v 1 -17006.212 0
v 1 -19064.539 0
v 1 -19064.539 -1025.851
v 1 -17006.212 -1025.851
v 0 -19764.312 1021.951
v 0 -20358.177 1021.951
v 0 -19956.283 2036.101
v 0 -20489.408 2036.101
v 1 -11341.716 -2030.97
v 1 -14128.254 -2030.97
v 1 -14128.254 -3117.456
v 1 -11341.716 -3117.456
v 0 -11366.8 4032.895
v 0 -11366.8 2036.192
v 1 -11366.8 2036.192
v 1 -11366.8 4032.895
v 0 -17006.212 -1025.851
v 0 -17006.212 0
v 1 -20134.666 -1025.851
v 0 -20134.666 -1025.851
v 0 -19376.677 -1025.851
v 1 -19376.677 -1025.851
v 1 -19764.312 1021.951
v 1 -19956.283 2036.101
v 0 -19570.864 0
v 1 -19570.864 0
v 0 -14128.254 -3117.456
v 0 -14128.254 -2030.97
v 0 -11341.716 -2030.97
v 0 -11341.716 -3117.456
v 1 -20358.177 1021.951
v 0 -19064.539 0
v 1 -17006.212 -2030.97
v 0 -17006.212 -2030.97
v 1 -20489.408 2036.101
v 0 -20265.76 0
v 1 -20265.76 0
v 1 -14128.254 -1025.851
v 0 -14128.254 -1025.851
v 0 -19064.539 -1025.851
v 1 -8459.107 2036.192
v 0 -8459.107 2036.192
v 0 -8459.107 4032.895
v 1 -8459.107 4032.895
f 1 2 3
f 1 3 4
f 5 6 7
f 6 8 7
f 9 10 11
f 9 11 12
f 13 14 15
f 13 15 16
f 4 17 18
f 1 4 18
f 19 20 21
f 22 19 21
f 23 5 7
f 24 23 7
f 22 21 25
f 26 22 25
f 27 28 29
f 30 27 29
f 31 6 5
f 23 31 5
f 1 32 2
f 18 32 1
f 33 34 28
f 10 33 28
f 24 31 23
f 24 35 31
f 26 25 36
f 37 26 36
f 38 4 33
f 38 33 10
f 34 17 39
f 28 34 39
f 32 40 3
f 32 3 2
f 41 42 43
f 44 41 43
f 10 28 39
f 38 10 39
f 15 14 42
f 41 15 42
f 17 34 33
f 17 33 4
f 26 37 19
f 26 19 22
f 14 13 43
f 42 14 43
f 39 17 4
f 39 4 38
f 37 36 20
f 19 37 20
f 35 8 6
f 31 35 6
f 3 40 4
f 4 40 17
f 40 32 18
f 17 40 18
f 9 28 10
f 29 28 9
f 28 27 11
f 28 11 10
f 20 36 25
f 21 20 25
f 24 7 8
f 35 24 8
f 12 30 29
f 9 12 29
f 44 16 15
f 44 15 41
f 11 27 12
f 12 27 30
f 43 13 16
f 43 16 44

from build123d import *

# Parameters (mm, degrees)
F2_W     = 2786.5381240845
F2_H     = 1086.4863395691
F3_DEPTH = 1
F2_W_2   = 2877.9582977295
F2_H_2   = 1005.1188468933
F2_W_3   = 2058.3267211914
F2_H_3   = 1025.8510112762
F2_W_4   = 2907.6929092407
F2_H_4   = 1996.7029094696


with BuildPart() as f3:
    # F2 (on Right) → F3 (new body)
    with BuildSketch(Plane.YZ):
        with Locations((-12734.9848747253, -2574.2130279541)):
            Rectangle(F2_W, F2_H)
    extrude(amount=F3_DEPTH)


with BuildPart() as f3b:
    # F2 (on Right) → F3, piece 2 (new body)
    with BuildSketch(Plane.YZ):
        with Locations((-15567.2330856323, -1528.4104347229)):
            Rectangle(F2_W_2, F2_H_2)
    extrude(amount=F3_DEPTH)


with BuildPart() as f3c:
    # F2 (on Right) → F3, piece 3 (new body)
    with BuildSketch(Plane.YZ):
        with Locations((-18035.3755950928, -512.9255056381)):
            Rectangle(F2_W_3, F2_H_3)
    extrude(amount=F3_DEPTH)


with BuildPart() as f3d:
    # F2 (on Right) → F3, piece 4 (new body)
    with BuildSketch(Plane.YZ):
        Polygon((-19376.6774103795, -1025.8510112762), (-19570.8637237549, 0), (-20265.7604217529, 0), (-20134.6664428711, -1025.8510112762), align=None)
    extrude(amount=F3_DEPTH)


with BuildPart() as f3e:
    # F2 (on Right) → F3, piece 5 (new body)
    with BuildSketch(Plane.YZ):
        Polygon((-20358.1771850586, 1021.9507200357), (-19764.3117396887, 1021.9507200357), (-19956.2831208382, 2036.1006468002), (-20489.408493042, 2036.1006468002), align=None)
    extrude(amount=F3_DEPTH)


with BuildPart() as f3f:
    # F2 (on Right) → F3, piece 6 (new body)
    with BuildSketch(Plane.YZ):
        with Locations((-9912.9538536072, 3034.5431566238)):
            Rectangle(F2_W_4, F2_H_4)
    extrude(amount=F3_DEPTH)


solid = Compound([f3.part, f3b.part, f3c.part, f3d.part, f3e.part, f3f.part])
